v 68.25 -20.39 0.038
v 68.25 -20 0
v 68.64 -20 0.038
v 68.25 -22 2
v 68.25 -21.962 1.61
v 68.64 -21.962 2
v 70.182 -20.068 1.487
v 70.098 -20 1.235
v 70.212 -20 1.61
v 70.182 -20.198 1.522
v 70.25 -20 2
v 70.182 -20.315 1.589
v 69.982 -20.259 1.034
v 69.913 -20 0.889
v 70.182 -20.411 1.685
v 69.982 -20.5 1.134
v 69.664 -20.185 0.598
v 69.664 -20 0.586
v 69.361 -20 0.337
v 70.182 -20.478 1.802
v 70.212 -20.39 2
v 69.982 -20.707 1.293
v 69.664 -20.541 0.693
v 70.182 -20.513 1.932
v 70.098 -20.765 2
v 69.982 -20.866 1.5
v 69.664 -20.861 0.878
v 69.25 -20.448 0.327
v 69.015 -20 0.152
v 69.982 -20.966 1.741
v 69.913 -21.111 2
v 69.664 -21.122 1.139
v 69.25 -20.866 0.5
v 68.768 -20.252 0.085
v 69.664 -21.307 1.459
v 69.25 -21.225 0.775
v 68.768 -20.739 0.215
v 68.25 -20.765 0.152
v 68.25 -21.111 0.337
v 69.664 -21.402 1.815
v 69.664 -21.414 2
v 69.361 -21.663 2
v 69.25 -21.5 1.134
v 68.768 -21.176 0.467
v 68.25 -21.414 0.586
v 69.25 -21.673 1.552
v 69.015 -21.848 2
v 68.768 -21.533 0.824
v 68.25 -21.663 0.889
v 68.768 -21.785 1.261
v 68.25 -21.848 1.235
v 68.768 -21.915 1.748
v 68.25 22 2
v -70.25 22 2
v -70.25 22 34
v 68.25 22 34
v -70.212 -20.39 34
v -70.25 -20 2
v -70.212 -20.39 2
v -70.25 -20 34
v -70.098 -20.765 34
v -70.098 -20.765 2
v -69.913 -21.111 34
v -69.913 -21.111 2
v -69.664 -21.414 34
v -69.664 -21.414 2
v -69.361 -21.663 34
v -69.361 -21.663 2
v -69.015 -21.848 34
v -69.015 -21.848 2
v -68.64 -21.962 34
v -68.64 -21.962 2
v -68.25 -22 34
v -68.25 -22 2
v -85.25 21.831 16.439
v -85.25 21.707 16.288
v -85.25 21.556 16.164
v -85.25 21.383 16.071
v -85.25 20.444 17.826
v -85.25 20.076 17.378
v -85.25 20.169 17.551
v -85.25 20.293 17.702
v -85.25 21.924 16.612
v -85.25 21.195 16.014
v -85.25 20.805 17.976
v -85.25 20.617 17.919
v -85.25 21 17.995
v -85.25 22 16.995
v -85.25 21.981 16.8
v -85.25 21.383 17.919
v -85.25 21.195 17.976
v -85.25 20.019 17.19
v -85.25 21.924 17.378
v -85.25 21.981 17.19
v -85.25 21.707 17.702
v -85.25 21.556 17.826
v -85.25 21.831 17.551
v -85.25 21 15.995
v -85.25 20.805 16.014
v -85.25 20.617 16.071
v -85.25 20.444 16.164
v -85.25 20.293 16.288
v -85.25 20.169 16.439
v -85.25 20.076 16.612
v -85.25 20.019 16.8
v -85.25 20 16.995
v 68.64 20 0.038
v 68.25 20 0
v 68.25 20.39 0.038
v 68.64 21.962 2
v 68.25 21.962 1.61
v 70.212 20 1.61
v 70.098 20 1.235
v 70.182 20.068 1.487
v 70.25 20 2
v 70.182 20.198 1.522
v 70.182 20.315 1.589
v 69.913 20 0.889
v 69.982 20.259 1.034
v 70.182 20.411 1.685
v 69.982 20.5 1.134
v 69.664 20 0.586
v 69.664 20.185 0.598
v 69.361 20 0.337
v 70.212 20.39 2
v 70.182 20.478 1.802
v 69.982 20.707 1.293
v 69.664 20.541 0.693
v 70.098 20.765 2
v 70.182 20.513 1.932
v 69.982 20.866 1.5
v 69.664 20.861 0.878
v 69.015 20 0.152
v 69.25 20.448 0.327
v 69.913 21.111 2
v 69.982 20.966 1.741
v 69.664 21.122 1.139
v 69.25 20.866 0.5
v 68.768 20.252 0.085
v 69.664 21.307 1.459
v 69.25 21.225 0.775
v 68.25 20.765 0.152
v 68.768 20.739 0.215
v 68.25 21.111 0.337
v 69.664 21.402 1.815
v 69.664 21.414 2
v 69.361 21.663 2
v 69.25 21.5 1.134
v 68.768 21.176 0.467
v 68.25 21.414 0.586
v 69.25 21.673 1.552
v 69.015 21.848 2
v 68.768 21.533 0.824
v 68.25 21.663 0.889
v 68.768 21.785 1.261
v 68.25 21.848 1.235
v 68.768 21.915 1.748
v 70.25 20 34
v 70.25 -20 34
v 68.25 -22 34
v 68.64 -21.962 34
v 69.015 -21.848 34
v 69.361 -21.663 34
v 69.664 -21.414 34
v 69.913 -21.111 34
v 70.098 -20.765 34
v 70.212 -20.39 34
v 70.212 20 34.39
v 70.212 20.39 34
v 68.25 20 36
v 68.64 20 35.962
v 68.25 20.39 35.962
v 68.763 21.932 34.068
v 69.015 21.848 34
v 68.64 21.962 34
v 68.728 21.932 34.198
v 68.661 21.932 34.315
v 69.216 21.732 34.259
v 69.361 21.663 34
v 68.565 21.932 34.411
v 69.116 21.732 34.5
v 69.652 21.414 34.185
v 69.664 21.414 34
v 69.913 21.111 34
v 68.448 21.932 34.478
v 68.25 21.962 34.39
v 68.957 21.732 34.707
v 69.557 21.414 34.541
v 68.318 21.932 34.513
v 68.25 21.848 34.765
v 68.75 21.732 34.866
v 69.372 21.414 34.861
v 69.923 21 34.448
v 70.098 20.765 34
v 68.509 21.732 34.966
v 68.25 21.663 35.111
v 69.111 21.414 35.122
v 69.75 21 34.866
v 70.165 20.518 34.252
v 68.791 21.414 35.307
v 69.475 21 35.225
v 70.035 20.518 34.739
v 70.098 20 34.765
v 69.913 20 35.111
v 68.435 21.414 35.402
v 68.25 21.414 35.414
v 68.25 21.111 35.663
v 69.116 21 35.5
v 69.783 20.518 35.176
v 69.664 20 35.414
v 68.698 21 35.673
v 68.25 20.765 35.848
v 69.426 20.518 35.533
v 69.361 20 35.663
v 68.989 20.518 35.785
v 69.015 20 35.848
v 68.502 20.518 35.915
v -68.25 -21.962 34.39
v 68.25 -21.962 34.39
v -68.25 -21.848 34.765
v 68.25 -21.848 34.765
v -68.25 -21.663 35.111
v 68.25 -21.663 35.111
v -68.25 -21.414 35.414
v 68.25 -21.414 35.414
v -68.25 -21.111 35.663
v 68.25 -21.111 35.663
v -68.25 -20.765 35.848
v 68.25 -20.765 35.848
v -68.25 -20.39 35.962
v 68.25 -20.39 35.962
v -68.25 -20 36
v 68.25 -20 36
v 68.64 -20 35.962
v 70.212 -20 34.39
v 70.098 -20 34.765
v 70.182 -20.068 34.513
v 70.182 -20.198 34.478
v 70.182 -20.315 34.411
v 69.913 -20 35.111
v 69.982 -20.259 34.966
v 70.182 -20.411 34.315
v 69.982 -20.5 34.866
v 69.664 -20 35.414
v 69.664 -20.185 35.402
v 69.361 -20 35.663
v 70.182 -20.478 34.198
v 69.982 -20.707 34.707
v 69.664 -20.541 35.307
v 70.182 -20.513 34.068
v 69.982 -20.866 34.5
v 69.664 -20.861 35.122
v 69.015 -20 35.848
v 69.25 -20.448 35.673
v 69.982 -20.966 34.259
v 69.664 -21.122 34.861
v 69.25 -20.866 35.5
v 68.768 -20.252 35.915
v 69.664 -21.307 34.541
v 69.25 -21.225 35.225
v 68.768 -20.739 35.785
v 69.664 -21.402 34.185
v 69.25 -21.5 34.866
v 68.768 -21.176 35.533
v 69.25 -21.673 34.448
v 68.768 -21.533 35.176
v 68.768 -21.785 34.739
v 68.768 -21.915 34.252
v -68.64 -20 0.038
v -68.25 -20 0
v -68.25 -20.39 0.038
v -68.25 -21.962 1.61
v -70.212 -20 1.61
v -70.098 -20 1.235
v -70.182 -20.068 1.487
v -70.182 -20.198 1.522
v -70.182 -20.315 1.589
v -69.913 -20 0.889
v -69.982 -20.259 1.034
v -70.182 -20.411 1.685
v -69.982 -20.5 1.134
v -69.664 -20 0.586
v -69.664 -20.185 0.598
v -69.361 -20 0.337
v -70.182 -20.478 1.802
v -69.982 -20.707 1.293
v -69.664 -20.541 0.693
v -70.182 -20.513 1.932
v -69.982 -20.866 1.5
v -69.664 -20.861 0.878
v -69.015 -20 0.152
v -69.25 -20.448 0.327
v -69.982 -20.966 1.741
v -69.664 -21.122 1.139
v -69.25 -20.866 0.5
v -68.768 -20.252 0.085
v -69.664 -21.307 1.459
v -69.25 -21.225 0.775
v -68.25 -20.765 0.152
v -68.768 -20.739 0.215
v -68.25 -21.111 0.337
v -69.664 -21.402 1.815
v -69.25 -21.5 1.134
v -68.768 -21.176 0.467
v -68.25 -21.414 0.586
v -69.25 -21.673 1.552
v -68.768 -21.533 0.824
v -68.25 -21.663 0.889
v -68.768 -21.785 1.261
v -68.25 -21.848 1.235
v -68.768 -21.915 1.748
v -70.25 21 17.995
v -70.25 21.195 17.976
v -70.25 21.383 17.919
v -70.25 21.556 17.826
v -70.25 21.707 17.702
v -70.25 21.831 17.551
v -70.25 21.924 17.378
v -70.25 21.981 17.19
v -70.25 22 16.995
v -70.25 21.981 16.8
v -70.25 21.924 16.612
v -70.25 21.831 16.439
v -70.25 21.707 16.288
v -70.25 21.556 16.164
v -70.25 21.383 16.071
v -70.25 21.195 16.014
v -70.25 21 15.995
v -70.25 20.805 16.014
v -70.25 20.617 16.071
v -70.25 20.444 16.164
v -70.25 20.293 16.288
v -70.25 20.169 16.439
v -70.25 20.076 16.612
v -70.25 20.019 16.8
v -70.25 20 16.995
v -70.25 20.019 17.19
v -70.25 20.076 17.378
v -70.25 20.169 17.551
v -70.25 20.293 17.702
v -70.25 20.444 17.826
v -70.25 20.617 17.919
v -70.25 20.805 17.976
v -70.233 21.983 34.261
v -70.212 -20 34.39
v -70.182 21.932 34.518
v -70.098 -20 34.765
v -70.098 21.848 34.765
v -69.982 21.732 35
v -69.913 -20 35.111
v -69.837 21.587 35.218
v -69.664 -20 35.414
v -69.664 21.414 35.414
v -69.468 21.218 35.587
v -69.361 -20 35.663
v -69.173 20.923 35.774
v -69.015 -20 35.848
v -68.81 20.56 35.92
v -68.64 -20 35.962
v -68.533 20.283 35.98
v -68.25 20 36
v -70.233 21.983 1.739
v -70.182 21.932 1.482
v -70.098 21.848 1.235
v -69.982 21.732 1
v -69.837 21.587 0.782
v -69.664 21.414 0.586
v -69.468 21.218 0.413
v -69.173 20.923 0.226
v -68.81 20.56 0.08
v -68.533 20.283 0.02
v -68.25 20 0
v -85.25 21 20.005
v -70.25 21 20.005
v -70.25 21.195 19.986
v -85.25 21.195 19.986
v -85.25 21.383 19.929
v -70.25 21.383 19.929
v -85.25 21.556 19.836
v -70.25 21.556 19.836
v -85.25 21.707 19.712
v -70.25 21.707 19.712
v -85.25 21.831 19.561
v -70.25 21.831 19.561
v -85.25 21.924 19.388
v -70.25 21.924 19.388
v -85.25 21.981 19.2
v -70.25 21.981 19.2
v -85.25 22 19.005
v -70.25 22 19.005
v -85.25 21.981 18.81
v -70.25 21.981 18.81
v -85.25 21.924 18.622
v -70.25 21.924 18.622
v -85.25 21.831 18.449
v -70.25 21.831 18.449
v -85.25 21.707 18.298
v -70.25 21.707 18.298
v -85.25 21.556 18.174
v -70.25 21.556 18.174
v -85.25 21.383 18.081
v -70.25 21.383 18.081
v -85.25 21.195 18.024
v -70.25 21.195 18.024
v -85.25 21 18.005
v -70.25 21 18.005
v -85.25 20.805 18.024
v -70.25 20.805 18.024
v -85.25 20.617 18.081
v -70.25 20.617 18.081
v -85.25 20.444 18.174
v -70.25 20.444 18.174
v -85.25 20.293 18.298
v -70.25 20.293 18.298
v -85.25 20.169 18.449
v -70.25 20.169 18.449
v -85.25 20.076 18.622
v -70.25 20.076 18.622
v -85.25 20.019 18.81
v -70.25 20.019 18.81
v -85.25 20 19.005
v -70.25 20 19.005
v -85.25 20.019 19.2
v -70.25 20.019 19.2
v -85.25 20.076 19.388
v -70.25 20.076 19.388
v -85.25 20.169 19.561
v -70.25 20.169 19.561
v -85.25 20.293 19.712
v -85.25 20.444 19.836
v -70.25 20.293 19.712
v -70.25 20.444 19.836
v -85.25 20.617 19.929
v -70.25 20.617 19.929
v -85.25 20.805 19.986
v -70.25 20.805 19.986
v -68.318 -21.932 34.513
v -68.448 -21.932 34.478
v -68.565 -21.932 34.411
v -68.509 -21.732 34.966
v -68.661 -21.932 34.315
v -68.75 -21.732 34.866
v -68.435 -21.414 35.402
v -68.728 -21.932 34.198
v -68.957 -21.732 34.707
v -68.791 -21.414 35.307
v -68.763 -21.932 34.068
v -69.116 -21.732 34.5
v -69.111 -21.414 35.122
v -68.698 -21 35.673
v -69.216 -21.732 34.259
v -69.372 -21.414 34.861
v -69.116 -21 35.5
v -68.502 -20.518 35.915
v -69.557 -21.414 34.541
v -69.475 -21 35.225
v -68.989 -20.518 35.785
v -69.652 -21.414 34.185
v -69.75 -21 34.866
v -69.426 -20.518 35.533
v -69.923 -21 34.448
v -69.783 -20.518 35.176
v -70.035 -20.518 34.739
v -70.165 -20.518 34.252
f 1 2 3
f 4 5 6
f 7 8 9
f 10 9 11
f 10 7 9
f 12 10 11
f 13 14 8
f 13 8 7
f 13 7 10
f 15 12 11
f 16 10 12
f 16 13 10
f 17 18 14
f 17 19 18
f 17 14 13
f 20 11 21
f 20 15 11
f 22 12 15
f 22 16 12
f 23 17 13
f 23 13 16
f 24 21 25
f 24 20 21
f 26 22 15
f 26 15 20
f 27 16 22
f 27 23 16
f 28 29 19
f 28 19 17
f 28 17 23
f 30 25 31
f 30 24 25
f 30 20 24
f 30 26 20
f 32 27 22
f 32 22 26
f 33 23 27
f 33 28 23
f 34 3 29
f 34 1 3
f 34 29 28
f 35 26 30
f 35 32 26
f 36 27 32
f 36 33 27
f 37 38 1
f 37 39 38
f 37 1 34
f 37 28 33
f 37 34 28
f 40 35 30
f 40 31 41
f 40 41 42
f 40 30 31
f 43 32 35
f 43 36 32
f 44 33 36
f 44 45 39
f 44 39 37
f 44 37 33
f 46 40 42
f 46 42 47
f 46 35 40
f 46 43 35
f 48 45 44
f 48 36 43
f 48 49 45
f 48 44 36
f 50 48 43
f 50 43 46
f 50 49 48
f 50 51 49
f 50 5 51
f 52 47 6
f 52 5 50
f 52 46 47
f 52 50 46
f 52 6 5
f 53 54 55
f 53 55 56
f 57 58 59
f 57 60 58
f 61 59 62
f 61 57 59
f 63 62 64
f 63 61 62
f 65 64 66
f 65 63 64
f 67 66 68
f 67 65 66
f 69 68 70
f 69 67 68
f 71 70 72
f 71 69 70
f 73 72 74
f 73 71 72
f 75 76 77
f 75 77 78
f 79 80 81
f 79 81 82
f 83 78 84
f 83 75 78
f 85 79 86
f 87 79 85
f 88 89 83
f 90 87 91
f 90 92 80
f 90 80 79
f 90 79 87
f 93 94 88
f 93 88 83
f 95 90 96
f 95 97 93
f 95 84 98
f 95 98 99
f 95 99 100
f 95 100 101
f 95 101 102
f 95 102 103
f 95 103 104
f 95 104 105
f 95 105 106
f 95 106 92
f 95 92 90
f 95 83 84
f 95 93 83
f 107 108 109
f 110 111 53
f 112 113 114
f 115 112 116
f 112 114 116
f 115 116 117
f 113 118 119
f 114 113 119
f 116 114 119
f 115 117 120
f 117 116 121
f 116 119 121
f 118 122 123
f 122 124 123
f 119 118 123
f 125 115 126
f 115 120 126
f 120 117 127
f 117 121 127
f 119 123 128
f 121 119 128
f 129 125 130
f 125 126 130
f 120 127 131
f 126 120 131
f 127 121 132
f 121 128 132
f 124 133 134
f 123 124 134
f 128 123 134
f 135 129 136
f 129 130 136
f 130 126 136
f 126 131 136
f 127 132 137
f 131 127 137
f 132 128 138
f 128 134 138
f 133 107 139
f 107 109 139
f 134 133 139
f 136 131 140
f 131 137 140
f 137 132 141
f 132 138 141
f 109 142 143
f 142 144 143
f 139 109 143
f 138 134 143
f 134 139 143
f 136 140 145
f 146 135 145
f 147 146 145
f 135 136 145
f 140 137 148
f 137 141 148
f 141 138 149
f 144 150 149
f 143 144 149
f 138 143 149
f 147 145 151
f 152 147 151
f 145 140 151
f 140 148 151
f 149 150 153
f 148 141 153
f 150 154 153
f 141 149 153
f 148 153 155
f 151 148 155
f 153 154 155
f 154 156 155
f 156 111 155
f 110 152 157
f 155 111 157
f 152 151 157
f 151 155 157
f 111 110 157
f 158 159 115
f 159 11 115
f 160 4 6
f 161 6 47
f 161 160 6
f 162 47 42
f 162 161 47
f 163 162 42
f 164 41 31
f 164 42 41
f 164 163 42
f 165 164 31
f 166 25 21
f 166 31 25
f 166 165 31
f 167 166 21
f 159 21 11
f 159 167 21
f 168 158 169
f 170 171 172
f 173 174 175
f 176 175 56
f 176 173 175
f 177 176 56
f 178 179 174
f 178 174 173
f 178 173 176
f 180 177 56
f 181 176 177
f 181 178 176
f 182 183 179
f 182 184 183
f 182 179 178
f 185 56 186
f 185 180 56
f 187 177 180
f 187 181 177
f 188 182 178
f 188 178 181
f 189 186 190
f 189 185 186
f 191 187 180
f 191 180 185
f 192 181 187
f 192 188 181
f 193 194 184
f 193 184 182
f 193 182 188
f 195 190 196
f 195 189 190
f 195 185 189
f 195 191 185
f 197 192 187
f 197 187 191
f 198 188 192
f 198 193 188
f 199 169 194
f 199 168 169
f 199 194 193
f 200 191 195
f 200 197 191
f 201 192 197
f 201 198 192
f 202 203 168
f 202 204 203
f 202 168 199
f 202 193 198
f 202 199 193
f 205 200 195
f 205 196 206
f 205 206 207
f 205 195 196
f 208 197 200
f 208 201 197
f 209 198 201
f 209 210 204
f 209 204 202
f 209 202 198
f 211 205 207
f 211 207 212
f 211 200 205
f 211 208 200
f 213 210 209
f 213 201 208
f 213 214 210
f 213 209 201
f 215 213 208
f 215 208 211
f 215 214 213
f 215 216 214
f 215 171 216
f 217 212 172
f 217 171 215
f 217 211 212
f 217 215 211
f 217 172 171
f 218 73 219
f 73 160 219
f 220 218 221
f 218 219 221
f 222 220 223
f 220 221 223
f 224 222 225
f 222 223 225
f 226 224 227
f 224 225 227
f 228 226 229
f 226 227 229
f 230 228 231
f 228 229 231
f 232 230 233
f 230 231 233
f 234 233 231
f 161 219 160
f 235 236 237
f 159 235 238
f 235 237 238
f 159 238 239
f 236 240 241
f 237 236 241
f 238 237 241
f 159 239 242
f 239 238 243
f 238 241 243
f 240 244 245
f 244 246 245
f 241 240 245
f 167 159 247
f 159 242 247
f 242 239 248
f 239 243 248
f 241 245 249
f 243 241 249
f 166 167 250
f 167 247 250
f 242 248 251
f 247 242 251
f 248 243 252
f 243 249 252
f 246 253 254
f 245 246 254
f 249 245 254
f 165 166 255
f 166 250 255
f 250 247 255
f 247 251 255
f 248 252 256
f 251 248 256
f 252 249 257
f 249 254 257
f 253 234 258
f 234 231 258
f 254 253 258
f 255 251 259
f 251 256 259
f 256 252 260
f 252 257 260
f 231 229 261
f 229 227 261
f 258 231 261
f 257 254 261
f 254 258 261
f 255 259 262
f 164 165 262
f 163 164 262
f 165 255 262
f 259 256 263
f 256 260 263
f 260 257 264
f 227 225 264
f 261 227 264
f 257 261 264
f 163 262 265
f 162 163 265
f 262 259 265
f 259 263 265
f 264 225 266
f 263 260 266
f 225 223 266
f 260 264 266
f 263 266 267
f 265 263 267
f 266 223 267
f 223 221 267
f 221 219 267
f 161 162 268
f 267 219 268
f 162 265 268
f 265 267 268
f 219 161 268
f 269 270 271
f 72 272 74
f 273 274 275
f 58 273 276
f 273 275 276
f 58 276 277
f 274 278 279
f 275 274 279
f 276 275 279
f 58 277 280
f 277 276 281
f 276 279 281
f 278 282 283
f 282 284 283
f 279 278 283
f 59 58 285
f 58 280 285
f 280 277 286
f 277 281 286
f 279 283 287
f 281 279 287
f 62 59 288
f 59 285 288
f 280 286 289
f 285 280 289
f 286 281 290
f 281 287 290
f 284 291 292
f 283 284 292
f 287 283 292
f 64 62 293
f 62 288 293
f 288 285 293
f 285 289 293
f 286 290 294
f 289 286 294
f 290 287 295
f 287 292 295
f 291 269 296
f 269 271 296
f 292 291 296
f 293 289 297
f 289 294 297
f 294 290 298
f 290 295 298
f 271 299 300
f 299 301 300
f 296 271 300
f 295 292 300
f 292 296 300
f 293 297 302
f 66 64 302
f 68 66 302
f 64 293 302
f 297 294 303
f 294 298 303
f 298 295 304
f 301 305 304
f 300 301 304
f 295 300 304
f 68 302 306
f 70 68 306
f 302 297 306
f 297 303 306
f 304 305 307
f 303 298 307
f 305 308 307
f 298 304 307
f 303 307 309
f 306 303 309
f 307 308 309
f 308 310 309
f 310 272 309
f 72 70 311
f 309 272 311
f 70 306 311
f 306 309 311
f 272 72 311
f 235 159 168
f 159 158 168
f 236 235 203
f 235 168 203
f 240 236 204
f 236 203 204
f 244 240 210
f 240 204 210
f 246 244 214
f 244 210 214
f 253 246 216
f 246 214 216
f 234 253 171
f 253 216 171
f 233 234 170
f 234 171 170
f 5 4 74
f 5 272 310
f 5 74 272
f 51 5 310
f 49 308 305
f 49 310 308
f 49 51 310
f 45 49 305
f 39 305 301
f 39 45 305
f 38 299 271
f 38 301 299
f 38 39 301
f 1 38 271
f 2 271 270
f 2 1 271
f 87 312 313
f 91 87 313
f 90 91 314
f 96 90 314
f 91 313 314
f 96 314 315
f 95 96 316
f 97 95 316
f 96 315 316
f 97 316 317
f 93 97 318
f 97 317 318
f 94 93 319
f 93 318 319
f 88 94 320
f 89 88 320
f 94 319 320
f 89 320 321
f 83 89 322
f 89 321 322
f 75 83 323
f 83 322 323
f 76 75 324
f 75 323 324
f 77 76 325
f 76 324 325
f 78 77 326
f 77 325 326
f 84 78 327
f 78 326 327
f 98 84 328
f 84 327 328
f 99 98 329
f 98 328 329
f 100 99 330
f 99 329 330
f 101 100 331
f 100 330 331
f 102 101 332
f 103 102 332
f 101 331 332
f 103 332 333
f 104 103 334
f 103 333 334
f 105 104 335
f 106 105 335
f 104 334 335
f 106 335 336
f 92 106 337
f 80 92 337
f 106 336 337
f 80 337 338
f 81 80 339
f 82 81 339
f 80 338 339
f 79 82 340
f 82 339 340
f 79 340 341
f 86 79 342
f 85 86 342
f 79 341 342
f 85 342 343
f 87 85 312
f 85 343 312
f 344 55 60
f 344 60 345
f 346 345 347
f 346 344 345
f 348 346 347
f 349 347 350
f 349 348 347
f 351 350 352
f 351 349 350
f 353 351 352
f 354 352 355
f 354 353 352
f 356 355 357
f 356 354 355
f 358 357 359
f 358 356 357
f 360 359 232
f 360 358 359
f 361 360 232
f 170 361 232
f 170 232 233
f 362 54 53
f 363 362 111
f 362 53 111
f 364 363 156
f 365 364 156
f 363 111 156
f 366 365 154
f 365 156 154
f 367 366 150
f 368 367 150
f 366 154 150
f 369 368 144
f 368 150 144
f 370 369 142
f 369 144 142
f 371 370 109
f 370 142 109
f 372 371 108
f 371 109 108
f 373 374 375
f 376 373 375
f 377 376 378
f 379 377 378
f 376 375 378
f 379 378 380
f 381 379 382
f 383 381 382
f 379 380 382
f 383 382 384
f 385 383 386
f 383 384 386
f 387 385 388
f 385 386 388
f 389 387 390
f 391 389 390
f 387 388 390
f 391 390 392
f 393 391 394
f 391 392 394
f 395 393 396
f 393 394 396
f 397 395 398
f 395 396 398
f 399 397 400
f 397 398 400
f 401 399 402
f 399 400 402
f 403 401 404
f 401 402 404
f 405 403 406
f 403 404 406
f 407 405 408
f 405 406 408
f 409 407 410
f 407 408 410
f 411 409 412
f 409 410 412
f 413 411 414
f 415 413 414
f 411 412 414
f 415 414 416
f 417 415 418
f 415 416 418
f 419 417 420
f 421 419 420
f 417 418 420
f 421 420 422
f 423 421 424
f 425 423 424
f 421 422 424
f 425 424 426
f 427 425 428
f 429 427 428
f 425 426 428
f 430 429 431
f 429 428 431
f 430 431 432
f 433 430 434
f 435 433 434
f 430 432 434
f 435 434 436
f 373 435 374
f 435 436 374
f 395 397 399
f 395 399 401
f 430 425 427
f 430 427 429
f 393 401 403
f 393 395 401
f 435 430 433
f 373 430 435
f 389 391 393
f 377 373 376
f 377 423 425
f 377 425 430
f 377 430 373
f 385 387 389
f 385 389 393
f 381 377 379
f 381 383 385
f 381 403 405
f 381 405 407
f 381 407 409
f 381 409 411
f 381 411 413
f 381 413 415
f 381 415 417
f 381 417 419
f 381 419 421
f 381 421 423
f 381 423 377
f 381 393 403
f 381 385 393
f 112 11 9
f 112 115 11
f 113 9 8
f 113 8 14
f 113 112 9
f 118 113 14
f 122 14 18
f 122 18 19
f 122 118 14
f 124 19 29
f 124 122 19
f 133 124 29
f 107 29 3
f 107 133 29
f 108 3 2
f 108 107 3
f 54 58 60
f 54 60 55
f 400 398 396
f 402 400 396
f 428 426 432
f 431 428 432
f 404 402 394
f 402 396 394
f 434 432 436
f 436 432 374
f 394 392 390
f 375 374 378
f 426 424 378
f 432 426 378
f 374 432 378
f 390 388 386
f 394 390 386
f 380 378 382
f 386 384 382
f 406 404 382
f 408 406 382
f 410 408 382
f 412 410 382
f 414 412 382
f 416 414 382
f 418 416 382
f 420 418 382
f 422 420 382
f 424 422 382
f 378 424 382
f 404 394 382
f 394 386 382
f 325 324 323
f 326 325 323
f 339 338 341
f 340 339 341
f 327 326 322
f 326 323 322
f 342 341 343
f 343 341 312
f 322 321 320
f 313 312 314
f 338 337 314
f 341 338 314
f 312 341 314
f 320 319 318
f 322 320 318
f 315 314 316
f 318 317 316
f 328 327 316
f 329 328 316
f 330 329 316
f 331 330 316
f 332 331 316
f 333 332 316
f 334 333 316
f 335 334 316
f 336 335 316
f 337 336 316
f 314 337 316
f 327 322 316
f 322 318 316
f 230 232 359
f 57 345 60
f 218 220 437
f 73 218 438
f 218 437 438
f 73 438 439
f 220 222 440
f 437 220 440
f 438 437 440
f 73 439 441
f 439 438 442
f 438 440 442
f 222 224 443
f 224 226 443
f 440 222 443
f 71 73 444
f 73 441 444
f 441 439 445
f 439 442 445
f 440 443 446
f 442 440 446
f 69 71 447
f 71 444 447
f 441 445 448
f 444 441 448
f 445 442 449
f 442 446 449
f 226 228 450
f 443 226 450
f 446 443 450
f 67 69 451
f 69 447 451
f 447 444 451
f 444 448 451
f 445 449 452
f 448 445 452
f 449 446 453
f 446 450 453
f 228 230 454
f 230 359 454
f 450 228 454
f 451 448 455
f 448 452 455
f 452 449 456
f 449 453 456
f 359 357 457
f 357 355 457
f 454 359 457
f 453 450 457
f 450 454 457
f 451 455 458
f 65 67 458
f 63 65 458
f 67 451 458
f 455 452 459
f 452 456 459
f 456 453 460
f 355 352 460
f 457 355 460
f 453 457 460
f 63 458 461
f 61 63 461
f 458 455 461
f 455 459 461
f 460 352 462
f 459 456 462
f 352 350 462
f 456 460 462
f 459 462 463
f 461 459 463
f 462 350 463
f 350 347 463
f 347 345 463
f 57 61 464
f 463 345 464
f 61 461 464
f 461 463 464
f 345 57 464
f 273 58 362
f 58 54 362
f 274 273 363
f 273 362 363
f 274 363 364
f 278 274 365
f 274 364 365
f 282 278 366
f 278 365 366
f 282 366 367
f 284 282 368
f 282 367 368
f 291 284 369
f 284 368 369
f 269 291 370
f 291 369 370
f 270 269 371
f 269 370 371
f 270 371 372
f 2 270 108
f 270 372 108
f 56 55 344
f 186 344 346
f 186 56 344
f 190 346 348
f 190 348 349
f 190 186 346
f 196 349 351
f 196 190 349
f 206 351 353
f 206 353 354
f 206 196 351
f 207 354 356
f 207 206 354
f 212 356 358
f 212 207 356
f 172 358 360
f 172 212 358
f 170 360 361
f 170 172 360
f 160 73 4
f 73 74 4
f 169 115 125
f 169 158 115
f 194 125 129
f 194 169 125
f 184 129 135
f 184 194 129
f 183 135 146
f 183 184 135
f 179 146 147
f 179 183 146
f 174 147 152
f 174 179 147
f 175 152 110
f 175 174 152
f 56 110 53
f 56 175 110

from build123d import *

# Parameters (mm, degrees)
SKETCH1_W             = 140.5
SKETCH1_H             = 44
BOSS_EXTRUDE1_DEPTH   = 36
SKETCH2_R             = 1
BOSS_EXTRUDE4_DEPTH   = 15
BOSS_EXTRUDE4_2_DEPTH = 15
FILLET1_R             = 2


with BuildPart() as part:
    # Sketch1 → Boss-Extrude1 (new body)
    with BuildSketch(Plane.XY):
        Rectangle(SKETCH1_W, SKETCH1_H)
    extrude(amount=BOSS_EXTRUDE1_DEPTH)

    # Fillet1
    fillet1_edges = [part.edges().sort_by_distance(p)[0] for p in [
        (-70.25, 0, 36),
        (0, -22, 36),
        (70.25, 0, 36),
        (0, -22, 0),
        (-70.25, 0, 0),
        (0, 22, 0),
        (70.25, 0, 0),
        (70.25, -22, 18),
        (-70.25, -22, 18),
        (70.25, 22, 18),
        (0, 22, 36),
    ]]
    fillet(fillet1_edges, radius=FILLET1_R)


with BuildPart() as body_2:
    # Sketch2 → Boss-Extrude4 (new body)
    with BuildSketch(Plane.ZY.offset(70.25)):
        with Locations((16.995, 21)):
            Circle(SKETCH2_R)
    extrude(amount=BOSS_EXTRUDE4_DEPTH)


with BuildPart() as body_3:
    # Sketch2 → Boss-Extrude4 2 (new body)
    with BuildSketch(Plane.ZY.offset(70.25)):
        with Locations((19.005, 21)):
            Circle(SKETCH2_R)
    extrude(amount=BOSS_EXTRUDE4_2_DEPTH)


solid = Compound([part.part, body_2.part, body_3.part])
